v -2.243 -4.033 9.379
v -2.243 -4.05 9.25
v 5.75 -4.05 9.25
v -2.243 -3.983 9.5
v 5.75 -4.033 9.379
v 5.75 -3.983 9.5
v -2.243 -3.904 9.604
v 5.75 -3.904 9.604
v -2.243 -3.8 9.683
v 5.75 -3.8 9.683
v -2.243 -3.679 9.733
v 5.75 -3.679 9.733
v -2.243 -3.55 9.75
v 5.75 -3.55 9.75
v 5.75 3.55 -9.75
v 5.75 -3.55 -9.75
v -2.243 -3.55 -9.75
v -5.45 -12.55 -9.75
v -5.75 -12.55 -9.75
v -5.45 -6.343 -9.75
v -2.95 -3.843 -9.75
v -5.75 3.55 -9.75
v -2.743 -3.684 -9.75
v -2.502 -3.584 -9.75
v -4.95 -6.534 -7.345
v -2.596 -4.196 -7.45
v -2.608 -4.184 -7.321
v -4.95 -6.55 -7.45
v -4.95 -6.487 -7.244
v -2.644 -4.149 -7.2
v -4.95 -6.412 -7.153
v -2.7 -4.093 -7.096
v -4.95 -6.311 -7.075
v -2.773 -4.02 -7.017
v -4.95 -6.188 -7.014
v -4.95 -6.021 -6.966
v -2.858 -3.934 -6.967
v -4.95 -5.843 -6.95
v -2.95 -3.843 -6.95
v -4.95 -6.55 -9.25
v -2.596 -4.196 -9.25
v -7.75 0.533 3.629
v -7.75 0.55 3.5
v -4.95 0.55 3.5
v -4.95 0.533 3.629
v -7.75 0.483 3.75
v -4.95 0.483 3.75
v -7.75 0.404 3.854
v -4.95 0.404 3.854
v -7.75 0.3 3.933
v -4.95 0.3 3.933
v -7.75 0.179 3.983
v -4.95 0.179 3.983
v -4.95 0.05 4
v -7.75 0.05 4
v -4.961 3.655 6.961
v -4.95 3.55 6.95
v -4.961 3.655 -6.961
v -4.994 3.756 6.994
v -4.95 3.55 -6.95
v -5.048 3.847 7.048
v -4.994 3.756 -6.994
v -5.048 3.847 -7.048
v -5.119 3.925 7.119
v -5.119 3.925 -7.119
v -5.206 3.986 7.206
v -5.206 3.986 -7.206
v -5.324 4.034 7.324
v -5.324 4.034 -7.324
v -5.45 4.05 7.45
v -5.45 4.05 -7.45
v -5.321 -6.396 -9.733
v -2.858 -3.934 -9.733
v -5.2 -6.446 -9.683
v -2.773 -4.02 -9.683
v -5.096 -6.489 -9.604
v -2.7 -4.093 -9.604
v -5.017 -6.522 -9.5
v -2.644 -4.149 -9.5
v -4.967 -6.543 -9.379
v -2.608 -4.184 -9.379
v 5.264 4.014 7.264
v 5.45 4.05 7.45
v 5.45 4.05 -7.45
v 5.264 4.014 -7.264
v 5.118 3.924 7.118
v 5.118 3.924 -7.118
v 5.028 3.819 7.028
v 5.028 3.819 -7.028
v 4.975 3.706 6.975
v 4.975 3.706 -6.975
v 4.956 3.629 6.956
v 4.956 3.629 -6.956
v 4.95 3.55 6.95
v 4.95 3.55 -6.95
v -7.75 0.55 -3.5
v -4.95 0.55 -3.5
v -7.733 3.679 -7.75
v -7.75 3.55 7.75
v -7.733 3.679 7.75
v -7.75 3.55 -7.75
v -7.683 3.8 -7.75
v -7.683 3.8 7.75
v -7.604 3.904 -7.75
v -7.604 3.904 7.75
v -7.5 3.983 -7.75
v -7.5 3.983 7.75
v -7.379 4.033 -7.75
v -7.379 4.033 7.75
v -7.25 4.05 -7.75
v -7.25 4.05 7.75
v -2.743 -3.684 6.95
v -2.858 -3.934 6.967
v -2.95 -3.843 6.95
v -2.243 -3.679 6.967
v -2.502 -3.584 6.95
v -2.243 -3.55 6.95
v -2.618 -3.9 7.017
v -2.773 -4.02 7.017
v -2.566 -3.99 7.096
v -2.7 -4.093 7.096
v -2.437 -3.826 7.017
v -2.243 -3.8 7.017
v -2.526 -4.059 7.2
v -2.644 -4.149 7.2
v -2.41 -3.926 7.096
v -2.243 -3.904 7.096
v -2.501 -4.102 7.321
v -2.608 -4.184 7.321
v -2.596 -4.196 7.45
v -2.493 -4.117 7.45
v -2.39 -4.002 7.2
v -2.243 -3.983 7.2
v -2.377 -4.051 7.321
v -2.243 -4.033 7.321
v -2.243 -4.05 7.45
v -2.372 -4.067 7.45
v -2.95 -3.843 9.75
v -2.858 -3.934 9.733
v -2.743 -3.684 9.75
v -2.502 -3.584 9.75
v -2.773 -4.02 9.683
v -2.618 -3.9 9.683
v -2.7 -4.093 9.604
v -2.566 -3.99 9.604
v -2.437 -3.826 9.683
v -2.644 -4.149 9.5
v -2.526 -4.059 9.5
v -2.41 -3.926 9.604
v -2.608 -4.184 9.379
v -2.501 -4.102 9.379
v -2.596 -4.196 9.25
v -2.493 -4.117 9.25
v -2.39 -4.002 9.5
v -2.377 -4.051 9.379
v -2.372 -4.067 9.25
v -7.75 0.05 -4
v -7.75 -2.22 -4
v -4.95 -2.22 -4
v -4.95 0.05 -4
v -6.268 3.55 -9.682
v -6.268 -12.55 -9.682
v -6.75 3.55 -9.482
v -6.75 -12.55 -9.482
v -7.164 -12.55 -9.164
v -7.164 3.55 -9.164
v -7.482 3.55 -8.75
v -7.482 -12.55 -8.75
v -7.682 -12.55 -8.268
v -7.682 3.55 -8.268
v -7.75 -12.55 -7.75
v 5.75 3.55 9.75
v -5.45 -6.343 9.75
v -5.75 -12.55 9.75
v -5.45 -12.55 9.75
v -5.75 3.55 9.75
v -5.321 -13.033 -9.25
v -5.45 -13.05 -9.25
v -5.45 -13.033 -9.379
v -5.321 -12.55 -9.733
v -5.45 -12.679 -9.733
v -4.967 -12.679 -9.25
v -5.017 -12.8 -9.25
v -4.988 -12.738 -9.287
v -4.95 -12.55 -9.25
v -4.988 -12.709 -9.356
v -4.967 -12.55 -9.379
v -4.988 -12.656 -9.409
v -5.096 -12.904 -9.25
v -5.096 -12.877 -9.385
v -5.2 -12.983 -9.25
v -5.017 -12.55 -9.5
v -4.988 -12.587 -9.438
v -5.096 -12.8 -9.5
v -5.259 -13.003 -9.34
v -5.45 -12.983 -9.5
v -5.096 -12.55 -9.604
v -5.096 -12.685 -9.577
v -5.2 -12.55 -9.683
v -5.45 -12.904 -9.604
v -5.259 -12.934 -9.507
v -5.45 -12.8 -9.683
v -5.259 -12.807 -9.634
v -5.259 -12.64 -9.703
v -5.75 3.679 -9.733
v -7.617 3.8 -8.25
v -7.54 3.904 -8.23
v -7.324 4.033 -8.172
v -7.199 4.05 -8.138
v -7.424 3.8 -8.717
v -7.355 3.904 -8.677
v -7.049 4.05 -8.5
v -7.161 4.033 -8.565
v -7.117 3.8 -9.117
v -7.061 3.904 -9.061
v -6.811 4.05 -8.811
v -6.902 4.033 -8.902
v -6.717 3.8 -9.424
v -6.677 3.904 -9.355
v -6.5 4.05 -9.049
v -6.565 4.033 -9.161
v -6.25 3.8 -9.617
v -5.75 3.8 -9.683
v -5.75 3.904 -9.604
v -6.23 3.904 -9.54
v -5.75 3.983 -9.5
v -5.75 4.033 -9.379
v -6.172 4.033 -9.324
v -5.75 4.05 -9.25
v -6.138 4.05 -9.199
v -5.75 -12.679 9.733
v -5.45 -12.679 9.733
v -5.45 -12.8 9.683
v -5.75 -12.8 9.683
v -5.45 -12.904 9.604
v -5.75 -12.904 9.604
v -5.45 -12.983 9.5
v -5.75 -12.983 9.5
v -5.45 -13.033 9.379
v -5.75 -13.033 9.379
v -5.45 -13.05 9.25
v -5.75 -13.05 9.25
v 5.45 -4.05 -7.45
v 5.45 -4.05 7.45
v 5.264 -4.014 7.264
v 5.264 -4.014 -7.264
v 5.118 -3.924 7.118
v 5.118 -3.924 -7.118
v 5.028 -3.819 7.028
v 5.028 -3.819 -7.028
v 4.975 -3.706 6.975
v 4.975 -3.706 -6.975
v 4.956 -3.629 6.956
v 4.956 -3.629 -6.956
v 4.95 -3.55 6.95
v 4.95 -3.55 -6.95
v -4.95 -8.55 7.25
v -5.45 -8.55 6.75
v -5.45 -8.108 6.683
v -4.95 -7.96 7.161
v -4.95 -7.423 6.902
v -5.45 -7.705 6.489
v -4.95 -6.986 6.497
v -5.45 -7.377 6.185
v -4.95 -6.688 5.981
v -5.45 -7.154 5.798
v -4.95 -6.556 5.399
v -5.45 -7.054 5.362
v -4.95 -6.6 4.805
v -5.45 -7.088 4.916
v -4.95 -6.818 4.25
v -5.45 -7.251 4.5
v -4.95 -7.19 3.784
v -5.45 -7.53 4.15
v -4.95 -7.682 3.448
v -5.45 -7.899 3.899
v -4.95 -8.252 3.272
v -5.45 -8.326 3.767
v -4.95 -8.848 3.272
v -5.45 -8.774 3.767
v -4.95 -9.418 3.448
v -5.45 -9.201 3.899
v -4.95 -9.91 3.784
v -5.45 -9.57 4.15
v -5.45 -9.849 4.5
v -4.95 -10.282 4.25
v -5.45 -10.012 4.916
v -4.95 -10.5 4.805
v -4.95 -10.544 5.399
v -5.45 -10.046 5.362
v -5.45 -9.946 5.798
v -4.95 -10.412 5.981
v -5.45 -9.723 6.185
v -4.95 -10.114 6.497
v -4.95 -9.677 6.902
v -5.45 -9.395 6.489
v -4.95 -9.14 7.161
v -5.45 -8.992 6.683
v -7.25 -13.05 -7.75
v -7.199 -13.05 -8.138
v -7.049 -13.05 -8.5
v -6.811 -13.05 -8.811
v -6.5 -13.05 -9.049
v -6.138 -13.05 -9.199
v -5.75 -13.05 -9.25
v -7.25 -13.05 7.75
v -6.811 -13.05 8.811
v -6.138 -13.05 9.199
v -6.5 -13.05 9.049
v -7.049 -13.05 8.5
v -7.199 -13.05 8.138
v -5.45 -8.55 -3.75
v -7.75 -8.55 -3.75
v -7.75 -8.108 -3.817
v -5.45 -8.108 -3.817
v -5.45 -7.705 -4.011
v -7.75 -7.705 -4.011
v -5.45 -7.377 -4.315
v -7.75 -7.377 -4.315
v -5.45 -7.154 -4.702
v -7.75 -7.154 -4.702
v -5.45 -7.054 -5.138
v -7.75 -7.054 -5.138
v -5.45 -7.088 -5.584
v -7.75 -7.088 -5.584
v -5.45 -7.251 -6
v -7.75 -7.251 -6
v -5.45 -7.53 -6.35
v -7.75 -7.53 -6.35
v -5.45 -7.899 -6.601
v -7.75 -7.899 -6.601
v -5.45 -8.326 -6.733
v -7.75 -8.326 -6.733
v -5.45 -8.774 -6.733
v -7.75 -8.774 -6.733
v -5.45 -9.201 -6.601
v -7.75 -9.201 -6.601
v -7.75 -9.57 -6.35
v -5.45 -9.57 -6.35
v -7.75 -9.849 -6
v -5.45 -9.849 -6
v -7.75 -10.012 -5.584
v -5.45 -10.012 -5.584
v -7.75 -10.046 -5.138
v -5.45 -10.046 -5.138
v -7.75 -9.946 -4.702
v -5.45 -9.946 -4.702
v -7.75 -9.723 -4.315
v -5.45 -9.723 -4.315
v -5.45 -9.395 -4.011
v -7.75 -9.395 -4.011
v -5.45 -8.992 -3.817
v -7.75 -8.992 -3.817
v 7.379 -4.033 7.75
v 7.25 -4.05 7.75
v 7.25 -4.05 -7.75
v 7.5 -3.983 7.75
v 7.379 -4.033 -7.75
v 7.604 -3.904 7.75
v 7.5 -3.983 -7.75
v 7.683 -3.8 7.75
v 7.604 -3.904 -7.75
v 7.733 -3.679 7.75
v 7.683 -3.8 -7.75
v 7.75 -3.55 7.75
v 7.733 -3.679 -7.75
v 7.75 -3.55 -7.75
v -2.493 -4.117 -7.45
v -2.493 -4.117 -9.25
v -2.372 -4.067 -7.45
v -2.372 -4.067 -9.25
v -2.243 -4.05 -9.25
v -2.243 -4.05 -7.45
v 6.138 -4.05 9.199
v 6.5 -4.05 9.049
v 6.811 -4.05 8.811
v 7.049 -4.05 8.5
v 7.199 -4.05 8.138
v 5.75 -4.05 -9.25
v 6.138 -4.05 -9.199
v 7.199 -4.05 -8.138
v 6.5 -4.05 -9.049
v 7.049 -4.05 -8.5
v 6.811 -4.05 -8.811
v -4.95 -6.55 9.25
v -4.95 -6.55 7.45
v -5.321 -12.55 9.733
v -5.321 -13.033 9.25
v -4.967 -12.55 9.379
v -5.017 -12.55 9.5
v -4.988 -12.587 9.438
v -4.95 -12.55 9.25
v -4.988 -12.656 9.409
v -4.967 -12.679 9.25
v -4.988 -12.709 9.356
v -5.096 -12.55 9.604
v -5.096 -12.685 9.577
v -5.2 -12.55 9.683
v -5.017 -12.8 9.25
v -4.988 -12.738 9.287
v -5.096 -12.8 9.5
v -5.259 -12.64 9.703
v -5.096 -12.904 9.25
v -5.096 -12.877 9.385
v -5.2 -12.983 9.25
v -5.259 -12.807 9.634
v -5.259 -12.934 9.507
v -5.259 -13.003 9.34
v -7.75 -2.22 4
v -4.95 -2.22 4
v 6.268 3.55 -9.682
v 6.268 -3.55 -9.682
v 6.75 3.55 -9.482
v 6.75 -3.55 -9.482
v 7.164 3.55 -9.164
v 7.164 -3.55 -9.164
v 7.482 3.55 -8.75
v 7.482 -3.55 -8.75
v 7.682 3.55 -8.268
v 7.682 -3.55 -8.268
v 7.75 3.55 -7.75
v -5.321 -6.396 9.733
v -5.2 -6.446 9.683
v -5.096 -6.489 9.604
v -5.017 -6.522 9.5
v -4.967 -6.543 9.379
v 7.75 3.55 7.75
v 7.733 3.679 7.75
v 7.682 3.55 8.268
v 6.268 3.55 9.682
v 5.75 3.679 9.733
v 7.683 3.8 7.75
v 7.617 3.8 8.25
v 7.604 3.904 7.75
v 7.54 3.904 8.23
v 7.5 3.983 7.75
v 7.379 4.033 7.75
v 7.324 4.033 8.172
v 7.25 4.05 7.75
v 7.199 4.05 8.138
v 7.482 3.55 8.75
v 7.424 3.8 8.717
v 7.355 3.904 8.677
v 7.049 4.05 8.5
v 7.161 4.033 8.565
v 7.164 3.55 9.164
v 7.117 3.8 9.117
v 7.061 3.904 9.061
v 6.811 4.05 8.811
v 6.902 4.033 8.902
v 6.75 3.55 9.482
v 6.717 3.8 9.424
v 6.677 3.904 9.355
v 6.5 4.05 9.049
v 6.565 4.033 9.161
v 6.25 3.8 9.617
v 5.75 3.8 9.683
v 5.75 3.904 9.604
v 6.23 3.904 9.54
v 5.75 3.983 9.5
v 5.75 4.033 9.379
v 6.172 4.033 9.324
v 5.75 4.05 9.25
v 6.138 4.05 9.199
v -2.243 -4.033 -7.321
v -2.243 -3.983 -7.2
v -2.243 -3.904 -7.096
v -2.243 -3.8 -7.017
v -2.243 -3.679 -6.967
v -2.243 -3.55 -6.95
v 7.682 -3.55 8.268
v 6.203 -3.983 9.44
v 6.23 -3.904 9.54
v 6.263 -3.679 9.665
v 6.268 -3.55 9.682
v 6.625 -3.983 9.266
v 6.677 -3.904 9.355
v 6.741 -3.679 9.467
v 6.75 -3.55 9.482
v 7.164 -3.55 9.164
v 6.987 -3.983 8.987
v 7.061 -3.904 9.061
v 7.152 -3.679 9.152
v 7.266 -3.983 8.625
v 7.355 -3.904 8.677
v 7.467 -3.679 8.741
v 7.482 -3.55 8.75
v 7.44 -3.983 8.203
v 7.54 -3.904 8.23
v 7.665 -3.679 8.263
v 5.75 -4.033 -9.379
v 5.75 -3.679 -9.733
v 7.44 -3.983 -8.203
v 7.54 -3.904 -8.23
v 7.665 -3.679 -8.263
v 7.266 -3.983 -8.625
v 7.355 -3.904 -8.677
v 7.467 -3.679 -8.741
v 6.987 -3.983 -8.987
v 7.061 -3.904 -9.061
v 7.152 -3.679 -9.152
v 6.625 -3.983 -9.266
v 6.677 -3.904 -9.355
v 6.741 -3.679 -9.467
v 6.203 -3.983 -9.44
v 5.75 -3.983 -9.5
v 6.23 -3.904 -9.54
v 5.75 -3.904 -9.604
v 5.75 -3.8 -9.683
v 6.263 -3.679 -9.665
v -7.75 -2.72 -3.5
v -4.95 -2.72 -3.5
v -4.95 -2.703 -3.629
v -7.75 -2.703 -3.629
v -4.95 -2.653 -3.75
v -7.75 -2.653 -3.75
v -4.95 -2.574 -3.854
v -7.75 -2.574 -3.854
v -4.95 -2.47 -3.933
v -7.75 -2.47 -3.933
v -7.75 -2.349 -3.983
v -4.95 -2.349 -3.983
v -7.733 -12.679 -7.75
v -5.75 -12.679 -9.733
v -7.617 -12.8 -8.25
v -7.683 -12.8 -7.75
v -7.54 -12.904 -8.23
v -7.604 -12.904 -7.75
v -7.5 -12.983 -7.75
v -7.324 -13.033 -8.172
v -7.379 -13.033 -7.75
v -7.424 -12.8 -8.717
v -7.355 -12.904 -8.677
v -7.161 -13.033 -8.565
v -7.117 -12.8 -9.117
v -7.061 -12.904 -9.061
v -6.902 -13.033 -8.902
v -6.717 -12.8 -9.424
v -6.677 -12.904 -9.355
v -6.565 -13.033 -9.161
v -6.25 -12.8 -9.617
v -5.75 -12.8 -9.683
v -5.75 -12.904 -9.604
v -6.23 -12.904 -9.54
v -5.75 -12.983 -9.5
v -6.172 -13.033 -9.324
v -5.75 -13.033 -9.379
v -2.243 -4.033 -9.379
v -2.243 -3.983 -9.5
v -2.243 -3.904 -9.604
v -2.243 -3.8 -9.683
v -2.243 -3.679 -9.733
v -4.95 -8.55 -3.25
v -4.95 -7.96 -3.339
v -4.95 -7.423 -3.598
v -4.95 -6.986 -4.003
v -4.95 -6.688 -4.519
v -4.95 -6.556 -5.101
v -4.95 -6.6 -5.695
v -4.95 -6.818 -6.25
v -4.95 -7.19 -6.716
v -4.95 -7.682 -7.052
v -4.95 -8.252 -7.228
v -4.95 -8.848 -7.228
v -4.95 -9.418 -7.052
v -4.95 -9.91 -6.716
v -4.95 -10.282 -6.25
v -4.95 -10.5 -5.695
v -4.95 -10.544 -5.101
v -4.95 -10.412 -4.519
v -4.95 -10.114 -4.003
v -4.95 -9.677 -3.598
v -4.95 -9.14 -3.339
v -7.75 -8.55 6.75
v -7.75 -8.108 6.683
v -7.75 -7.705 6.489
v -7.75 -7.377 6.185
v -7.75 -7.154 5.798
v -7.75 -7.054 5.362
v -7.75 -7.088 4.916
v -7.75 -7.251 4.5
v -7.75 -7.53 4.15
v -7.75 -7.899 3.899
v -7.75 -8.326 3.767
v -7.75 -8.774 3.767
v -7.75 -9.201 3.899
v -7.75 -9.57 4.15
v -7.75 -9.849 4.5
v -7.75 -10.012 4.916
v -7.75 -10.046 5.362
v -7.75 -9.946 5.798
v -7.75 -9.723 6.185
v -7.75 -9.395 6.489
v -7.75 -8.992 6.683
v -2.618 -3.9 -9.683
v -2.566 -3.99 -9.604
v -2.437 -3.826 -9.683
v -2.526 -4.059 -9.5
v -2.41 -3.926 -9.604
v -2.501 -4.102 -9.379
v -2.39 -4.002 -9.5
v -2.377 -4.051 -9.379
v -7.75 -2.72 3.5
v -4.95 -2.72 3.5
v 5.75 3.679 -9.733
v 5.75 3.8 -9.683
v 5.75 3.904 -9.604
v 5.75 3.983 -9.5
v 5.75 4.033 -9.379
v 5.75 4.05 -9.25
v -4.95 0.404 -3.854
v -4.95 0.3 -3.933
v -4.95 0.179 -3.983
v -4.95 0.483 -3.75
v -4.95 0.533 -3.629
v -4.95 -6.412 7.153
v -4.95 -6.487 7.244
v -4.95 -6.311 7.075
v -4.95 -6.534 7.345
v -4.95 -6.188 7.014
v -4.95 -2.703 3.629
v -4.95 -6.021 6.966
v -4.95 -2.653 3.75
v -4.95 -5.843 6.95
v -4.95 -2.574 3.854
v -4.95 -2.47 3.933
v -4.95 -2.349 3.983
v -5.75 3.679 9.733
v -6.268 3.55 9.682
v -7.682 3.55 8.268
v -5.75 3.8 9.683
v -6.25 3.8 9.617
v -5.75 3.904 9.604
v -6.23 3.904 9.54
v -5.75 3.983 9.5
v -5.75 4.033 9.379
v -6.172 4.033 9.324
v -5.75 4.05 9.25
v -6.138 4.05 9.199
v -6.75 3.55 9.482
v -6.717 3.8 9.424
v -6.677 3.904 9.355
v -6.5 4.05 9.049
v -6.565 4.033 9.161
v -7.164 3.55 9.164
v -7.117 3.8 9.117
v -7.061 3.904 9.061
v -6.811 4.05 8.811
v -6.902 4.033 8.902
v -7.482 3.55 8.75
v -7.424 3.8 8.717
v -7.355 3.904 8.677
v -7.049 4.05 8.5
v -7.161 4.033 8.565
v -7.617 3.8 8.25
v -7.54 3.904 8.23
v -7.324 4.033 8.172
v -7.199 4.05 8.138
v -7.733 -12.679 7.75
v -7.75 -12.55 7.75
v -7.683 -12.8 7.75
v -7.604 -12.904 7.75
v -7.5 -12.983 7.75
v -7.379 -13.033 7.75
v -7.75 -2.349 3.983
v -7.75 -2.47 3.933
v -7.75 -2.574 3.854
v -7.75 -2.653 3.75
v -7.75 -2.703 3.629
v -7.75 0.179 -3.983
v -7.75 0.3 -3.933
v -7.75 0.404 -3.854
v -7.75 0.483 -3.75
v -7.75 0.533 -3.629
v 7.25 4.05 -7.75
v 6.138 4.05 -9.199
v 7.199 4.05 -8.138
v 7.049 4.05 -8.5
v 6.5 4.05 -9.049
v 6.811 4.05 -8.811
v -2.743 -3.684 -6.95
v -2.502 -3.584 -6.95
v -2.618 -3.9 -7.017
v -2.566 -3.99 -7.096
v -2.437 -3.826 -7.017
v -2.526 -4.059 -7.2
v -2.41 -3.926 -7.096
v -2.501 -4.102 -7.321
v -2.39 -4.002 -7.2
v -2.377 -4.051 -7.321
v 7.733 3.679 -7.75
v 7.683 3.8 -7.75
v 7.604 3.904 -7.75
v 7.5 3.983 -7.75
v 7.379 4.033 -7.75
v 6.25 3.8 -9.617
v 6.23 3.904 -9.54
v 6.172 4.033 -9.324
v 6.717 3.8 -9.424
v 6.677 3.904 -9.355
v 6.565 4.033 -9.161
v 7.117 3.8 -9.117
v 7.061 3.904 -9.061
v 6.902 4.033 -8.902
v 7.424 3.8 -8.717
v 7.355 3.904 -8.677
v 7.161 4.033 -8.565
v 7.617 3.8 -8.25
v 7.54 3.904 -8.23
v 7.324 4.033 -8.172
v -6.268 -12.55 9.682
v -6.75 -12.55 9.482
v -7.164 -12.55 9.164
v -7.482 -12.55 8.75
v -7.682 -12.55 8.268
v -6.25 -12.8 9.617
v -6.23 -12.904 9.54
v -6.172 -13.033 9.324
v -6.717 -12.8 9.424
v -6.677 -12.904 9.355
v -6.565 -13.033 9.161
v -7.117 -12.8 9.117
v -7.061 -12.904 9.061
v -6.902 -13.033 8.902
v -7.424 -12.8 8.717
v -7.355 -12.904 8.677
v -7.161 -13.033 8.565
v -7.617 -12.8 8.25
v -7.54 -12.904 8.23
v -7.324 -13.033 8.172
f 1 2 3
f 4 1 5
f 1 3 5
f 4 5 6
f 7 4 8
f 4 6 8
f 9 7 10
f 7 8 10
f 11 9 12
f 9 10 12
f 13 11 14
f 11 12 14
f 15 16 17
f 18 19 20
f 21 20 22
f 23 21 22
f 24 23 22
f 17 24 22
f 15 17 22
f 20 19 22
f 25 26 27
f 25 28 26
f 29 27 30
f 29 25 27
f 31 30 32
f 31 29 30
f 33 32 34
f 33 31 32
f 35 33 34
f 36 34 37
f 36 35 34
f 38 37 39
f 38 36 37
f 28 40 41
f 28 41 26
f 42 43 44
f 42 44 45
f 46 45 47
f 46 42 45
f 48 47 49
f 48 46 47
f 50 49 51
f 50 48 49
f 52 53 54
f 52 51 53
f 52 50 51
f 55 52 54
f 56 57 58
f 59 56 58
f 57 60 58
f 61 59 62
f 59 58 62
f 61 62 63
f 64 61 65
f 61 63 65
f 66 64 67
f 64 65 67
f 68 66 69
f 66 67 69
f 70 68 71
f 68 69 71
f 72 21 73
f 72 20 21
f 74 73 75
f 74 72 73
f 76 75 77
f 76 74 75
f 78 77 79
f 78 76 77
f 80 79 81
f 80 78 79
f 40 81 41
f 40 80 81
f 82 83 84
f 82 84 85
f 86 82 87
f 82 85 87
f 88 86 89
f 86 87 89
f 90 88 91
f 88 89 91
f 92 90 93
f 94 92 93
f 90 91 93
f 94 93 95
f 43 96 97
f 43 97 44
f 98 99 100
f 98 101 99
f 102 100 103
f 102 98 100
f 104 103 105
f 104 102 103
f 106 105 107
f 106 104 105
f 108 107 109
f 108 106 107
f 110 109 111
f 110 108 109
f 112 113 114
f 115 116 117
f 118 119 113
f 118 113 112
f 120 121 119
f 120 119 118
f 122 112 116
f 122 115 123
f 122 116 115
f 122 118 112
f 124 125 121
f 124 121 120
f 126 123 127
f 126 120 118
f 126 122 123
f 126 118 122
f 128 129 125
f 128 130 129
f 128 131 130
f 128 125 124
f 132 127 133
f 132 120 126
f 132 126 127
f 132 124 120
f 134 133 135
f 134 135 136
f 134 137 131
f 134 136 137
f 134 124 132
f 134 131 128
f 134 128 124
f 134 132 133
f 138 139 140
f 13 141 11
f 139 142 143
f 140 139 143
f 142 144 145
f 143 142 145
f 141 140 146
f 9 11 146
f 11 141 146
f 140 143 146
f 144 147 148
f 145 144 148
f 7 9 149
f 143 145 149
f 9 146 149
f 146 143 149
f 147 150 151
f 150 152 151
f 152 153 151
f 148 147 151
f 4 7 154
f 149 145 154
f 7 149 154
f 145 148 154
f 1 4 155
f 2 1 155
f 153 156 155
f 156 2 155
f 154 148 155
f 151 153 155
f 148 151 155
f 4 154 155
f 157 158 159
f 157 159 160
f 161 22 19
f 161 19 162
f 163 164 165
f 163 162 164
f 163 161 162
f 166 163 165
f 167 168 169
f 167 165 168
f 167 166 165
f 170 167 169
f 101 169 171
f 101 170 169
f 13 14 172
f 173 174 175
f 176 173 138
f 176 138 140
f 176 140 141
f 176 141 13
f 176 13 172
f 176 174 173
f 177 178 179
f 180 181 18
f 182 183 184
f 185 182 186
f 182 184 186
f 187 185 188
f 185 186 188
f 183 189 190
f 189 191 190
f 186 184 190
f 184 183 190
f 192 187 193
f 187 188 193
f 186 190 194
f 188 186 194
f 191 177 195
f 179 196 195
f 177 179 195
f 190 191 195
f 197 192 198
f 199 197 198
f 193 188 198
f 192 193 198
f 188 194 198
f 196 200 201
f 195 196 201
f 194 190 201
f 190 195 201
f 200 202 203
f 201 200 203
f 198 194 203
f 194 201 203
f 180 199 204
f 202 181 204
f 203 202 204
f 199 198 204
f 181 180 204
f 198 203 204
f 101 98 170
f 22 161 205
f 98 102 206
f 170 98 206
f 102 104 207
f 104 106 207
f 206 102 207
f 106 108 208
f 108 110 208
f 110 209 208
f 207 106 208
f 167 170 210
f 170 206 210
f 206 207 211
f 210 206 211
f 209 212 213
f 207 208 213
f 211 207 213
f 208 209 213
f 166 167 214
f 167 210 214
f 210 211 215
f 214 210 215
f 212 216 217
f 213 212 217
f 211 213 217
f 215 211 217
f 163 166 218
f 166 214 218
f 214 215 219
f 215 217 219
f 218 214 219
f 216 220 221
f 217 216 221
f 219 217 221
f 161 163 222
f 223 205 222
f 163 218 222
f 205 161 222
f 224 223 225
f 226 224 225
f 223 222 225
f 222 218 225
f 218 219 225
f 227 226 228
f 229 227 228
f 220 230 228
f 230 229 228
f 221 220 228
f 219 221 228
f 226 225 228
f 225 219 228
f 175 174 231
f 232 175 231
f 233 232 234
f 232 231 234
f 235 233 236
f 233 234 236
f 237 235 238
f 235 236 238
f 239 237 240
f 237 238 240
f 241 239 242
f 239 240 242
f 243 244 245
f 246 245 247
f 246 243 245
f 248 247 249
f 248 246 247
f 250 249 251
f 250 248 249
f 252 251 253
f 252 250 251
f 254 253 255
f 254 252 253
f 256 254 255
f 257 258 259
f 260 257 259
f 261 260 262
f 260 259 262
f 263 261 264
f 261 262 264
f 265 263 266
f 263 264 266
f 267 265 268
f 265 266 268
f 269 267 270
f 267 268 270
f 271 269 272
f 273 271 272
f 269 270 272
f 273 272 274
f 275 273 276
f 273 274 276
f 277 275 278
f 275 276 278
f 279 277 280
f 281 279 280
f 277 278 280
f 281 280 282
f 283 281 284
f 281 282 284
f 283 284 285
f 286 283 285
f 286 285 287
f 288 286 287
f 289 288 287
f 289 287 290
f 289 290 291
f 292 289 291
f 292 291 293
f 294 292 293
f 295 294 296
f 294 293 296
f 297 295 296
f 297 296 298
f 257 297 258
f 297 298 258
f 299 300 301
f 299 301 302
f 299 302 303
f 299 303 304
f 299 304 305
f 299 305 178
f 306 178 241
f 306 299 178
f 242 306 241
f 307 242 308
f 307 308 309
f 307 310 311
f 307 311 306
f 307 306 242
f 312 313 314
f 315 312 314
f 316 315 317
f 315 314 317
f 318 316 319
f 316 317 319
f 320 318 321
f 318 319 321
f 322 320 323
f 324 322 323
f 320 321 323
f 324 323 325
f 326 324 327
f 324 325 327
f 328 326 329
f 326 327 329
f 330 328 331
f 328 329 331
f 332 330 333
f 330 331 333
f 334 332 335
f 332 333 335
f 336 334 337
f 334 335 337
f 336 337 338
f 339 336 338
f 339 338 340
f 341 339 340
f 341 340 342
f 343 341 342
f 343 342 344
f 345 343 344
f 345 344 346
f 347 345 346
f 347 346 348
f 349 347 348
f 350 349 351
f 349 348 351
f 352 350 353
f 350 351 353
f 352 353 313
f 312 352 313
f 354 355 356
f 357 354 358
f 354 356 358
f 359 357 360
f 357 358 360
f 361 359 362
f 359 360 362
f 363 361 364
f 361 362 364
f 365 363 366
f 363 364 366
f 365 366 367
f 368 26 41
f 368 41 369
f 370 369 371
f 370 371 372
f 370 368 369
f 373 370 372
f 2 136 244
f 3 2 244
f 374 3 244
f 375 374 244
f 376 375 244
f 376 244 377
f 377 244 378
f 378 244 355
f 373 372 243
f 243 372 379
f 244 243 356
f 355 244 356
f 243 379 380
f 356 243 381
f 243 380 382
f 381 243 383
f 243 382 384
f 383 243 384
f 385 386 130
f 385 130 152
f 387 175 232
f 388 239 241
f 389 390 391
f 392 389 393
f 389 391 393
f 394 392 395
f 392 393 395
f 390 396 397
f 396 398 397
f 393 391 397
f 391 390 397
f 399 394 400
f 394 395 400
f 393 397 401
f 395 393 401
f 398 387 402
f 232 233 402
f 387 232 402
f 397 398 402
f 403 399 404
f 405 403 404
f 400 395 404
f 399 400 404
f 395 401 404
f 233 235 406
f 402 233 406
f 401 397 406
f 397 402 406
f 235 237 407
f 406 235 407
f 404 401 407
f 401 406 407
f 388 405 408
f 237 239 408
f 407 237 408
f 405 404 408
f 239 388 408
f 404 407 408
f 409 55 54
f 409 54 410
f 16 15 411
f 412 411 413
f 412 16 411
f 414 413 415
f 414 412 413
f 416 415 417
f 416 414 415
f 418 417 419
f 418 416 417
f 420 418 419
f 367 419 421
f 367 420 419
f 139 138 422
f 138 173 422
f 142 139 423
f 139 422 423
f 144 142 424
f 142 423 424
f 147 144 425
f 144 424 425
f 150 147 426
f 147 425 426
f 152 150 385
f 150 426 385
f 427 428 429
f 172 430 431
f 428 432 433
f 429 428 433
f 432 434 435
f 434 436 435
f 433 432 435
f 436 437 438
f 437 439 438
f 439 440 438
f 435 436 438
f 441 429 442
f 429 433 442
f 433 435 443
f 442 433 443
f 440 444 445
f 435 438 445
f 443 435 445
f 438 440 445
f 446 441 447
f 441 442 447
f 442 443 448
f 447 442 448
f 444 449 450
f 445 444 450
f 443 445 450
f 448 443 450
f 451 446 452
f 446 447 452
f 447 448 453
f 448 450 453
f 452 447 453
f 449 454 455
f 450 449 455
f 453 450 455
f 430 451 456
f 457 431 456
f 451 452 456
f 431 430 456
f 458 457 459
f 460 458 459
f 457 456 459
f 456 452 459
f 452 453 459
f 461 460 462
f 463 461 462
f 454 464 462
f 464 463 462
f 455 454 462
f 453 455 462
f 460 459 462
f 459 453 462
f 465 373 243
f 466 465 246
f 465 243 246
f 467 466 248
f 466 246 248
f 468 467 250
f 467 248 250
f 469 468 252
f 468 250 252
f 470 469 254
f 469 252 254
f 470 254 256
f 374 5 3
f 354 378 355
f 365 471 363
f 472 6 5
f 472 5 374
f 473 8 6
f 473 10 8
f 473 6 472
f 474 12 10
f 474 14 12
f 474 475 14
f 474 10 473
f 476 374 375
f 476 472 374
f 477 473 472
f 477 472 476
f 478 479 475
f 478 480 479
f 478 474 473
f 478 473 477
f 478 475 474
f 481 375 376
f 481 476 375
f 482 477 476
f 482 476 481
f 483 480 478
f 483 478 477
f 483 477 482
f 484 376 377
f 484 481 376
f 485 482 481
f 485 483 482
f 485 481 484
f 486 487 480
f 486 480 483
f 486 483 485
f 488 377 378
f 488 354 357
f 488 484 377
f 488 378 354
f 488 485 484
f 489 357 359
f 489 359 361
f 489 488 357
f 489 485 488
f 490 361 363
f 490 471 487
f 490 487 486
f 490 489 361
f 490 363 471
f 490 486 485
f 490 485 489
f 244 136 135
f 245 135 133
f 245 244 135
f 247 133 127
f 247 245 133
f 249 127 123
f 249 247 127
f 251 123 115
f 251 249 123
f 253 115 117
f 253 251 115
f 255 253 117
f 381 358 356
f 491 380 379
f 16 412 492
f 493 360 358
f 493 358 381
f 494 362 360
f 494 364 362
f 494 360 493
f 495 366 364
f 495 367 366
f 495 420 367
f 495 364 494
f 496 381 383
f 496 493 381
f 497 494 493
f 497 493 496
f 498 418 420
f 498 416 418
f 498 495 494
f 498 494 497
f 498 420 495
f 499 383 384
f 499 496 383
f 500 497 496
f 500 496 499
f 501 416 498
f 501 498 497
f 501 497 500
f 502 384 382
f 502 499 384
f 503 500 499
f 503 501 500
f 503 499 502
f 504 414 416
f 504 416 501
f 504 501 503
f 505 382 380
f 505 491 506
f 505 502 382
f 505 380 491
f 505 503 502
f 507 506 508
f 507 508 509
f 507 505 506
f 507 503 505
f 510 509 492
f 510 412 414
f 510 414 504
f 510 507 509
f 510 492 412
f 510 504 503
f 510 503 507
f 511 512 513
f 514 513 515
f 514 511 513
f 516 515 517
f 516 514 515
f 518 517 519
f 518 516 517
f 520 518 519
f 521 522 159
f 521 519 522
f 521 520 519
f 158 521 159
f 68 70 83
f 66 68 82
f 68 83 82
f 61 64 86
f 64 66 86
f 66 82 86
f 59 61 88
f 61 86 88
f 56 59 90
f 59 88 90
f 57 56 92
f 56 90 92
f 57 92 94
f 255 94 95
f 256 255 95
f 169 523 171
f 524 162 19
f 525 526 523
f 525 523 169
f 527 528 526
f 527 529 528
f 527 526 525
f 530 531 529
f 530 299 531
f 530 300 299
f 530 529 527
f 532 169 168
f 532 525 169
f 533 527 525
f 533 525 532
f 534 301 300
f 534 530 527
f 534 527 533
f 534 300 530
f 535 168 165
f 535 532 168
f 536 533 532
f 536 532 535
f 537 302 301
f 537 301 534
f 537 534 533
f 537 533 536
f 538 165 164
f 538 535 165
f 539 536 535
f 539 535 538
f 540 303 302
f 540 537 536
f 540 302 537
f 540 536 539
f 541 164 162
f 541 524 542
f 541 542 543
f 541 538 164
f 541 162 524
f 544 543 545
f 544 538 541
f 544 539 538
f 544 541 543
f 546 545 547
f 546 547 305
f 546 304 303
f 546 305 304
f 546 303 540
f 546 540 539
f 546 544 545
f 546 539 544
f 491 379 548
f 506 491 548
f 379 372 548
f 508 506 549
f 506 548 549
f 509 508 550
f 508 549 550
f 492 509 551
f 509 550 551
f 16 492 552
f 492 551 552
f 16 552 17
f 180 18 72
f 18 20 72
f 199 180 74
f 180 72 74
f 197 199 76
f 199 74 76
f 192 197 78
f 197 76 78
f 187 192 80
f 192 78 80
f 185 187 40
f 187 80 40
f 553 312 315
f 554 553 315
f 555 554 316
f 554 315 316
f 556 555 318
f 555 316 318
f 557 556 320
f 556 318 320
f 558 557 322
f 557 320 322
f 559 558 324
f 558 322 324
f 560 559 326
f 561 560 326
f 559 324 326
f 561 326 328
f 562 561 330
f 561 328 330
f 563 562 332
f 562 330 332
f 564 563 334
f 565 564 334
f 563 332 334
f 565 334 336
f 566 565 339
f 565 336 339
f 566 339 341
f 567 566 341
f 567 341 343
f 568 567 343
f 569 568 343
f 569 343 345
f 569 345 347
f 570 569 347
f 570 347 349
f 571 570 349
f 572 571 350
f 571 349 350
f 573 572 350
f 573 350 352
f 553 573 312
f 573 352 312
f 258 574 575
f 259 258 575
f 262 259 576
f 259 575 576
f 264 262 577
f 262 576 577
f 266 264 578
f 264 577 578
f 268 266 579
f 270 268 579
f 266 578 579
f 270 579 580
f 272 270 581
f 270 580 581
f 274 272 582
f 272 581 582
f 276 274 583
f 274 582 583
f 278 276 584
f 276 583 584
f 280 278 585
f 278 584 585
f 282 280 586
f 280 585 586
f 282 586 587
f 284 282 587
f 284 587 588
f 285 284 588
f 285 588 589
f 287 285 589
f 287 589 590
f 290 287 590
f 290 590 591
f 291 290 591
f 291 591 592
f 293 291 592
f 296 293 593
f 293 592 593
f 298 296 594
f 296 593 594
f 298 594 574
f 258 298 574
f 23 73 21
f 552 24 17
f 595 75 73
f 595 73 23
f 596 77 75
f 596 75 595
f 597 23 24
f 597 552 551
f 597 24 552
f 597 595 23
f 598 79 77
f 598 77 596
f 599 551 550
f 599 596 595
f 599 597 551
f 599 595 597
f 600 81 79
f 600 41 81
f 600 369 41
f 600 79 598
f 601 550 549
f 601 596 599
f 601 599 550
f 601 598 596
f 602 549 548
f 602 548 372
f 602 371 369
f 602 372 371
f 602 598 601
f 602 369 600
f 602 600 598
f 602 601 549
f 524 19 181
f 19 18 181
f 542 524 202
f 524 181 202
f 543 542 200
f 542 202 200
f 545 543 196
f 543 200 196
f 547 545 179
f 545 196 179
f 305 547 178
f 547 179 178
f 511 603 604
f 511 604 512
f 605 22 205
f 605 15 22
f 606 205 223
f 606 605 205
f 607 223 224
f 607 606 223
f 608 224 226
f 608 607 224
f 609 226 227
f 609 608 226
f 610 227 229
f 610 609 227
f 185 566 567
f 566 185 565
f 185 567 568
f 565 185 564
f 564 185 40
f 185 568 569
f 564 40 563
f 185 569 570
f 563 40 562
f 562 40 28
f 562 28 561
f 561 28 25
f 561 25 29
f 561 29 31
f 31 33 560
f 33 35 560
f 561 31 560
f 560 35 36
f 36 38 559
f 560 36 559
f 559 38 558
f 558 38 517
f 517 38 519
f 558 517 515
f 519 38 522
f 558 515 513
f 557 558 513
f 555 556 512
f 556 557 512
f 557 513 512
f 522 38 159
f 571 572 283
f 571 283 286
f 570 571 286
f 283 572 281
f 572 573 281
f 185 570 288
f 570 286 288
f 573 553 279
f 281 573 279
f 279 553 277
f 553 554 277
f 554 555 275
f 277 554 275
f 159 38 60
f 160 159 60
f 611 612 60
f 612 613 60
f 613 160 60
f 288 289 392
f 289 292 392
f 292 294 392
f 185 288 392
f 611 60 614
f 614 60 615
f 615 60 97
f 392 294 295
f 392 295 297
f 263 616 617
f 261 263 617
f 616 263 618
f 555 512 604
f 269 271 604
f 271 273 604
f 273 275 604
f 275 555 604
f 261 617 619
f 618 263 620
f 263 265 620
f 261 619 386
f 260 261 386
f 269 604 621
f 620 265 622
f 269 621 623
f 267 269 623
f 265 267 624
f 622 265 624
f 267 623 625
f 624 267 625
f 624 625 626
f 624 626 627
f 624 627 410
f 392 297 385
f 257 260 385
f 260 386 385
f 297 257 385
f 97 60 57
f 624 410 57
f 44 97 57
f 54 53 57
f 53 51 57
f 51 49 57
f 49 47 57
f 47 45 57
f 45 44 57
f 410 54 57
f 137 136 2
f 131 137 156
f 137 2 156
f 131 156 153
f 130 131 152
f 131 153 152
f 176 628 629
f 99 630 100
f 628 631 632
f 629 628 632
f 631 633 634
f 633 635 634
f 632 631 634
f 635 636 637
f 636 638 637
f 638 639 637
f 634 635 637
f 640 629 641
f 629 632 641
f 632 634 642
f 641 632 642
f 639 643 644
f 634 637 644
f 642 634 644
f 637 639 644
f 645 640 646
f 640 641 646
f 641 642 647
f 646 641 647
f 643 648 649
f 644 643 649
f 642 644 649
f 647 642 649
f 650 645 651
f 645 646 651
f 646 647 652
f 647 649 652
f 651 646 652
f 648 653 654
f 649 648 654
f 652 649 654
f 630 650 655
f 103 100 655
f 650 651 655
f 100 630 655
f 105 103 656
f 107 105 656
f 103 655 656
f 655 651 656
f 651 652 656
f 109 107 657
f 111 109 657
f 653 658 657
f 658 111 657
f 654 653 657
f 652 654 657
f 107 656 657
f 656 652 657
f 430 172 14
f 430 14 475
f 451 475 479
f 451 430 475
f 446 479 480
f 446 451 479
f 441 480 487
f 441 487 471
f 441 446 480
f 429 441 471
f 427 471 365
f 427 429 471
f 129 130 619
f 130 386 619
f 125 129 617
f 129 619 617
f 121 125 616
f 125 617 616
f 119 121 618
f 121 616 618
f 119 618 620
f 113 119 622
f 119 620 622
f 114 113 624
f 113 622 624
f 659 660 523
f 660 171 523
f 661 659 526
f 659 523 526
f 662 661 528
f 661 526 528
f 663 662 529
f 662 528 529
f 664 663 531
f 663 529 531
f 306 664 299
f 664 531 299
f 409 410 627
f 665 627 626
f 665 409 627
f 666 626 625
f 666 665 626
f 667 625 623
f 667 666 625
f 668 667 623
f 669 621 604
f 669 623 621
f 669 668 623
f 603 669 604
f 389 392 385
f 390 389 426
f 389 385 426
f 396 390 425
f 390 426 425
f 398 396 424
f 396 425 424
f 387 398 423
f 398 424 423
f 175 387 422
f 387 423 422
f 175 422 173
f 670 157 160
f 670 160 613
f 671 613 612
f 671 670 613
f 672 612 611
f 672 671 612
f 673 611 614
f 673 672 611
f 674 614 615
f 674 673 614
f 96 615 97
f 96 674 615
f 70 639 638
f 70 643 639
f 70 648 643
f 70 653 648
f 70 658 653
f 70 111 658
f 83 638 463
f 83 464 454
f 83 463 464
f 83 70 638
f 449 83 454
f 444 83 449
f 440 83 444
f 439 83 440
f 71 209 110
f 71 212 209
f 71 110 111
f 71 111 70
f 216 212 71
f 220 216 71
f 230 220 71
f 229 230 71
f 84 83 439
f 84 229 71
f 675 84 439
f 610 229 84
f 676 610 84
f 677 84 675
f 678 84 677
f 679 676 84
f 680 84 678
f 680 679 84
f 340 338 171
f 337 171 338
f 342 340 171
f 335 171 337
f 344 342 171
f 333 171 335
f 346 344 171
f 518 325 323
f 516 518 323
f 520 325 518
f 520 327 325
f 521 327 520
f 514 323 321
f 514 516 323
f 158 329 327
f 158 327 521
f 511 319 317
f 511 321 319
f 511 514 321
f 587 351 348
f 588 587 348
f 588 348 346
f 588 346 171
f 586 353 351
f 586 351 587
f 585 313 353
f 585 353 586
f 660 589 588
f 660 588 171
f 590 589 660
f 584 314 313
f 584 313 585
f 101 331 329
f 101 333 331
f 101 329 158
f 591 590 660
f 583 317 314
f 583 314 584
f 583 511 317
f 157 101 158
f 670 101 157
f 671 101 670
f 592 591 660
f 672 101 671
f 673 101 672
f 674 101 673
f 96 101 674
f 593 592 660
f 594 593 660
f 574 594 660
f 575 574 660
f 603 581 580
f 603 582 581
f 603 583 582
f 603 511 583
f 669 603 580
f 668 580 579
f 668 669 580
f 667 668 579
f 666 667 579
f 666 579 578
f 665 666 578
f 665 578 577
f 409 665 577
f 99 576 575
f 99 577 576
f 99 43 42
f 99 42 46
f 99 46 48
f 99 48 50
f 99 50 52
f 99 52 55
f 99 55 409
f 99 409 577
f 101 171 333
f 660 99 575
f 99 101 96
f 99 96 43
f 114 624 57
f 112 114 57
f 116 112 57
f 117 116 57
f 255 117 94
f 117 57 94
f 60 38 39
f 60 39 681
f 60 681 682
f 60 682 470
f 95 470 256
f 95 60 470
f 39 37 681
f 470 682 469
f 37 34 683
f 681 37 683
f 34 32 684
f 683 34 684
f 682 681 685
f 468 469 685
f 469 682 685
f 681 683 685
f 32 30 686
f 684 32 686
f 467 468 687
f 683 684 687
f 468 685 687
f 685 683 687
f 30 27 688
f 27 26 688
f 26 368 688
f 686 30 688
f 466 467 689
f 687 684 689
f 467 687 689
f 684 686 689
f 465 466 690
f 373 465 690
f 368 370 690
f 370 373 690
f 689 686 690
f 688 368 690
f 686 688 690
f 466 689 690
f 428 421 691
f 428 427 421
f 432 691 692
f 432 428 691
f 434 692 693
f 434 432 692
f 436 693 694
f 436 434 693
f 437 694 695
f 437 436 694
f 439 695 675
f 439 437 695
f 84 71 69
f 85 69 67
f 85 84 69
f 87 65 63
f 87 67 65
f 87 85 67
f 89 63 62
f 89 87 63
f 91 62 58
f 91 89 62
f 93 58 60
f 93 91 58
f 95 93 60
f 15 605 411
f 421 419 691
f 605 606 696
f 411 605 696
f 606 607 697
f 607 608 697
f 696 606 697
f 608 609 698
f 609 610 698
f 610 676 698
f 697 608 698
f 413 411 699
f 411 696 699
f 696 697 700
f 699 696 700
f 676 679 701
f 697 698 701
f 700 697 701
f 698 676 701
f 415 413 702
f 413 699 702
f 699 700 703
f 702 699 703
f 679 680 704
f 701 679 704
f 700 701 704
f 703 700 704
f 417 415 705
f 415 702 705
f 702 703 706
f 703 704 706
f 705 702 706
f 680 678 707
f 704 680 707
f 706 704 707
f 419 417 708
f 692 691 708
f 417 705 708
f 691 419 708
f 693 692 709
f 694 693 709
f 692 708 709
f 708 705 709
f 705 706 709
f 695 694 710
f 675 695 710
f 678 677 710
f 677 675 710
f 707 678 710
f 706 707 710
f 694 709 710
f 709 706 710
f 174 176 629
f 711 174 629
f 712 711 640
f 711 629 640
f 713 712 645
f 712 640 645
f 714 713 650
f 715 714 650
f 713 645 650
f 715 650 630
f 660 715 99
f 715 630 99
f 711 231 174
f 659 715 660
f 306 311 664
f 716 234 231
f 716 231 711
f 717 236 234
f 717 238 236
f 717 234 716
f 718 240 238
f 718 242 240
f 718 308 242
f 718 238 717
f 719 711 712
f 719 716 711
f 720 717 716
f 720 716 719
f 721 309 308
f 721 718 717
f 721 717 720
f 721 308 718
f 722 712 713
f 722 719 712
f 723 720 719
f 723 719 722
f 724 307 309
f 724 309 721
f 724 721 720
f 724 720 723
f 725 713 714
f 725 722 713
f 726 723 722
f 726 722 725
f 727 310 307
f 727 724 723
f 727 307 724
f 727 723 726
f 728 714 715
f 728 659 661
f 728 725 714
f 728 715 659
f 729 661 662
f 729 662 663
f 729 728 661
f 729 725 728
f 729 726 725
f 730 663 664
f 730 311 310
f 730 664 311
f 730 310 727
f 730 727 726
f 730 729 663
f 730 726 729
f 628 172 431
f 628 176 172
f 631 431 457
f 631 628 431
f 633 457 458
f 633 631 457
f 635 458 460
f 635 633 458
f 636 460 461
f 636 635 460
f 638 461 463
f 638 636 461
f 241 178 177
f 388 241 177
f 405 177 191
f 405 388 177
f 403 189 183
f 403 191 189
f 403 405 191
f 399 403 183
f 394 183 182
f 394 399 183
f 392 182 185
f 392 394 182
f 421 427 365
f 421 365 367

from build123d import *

# Parameters (mm, degrees)
SKETCH1_W                      = 15.5
SKETCH1_H                      = 19.5
SKETCH1_W_2                    = 9.9
SKETCH1_H_2                    = 13.9
BOSS_EXTRUDE1_DEPTH            = 4.05
SKETCH2_W                      = 19.5
SKETCH2_H                      = 9
SKETCH2_R                      = 1.5
BOSS_EXTRUDE2_DEPTH            = 2.8
CHAMFER1_SIZE                  = 2.5
FILLET1_R                      = 2
FILLET2_R                      = 0.5
CHAMFER2_SIZE                  = 0.5
CUT_EXTRUDE1_DEPTH             = 1.0000001
CUT_EXTRUDE1_DIRECTION_2_REACH = 17.5


with BuildPart() as part:
    # Sketch1 → Boss-Extrude1 (new body, symmetric)
    with BuildSketch(Plane(origin=(0, 0, 0), x_dir=(1, 0, 0), z_dir=(0, 1, 0))):
        Rectangle(SKETCH1_W, SKETCH1_H)
        Rectangle(SKETCH1_W_2, SKETCH1_H_2, mode=Mode.SUBTRACT)
    extrude(amount=BOSS_EXTRUDE1_DEPTH, both=True)

    # Sketch2 → Boss-Extrude2 (add)
    with BuildSketch(Plane.ZY.offset(7.75)):
        with Locations((0, -8.55)):
            Rectangle(SKETCH2_W, SKETCH2_H)
        with Locations((-5.25, -8.55)):
            Circle(SKETCH2_R, mode=Mode.SUBTRACT)
        with Locations((5.25, -8.55)):
            Circle(SKETCH2_R, mode=Mode.SUBTRACT)
    extrude(amount=-BOSS_EXTRUDE2_DEPTH)

    # Chamfer1
    chamfer1_edges = [part.edges().sort_by_distance(p)[0] for p in [
        (-4.95, -4.05, -8.35),
        (-4.95, -4.05, 8.35),
    ]]
    chamfer(chamfer1_edges, length=CHAMFER1_SIZE)

    # Fillet1
    fillet1_edges = [part.edges().sort_by_distance(p)[0] for p in [
        (-7.75, -4.5, -9.75),
        (7.75, 0, -9.75),
        (7.75, 0, 9.75),
        (-7.75, -4.5, 9.75),
    ]]
    fillet(fillet1_edges, radius=FILLET1_R)

    # Fillet2
    fillet2_edges = [part.edges().sort_by_distance(p)[0] for p in [
        (4.95, -4.05, 0),
        (1.25, -4.05, -6.95),
        (-4.95, 4.05, 0),
        (0, 4.05, 6.95),
        (4.95, 4.05, 0),
        (0, 4.05, -6.95),
        (-5.35, -13.05, -9.75),
        (-4.95, -9.8, 9.75),
        (-4.95, -13.05, 0),
        (-5.35, -13.05, 9.75),
        (1.65, -4.05, 9.75),
        (1.25, -4.05, 6.95),
        (-2.45, -4.05, 8.35),
        (-2.45, -4.05, -8.35),
        (-4.95, -9.8, -9.75),
        (-3.7, -5.3, -9.75),
        (-3.7, -5.3, -6.95),
        (-3.7, -5.3, 6.95),
        (-3.7, -5.3, 9.75),
        (1.65, -4.05, -9.75),
        (0, 4.05, -9.75),
        (7.75, -4.05, 0),
        (7.164213562, -4.05, 9.164213562),
        (7.164213562, -4.05, -9.164213562),
        (7.75, 4.05, 0),
        (-7.75, 4.05, 0),
        (0, 4.05, 9.75),
        (-7.164213562, 4.05, 9.164213562),
        (-7.164213562, 4.05, -9.164213562),
        (7.164213562, 4.05, 9.164213562),
        (7.164213562, 4.05, -9.164213562),
        (-7.75, -13.05, 0),
        (-7.164213562, -13.05, 9.164213562),
        (-7.164213562, -13.05, -9.164213562),
    ]]
    fillet(fillet2_edges, radius=FILLET2_R)

    # Chamfer2
    chamfer2_edges = [part.edges().sort_by_distance(p)[0] for p in [
        (-4.95, -8.55, 3.75),
        (-4.95, -8.55, -6.75),
    ]]
    chamfer(chamfer2_edges, length=CHAMFER2_SIZE)

    # Sketch3 → Cut-Extrude1 (cut)
    with BuildSketch(Plane.ZY.offset(7.75)):
        with BuildLine():
            Line((-3.5, 0.55), (3.5, 0.55))
            ThreePointArc((3.5, 0.55), (3.853553391, 0.403553391), (4, 0.05))
            Line((4, 0.05), (4, -2.22))
            ThreePointArc((4, -2.22), (3.853553391, -2.573553391), (3.5, -2.72))
            Line((3.5, -2.72), (-3.5, -2.72))
            ThreePointArc((-3.5, -2.72), (-3.853553391, -2.573553391), (-4, -2.22))
            Line((-4, -2.22), (-4, 0.05))
            ThreePointArc((-4, 0.05), (-3.853553391, 0.403553391), (-3.5, 0.55))
        make_face()
    extrude(amount=CUT_EXTRUDE1_DEPTH, mode=Mode.SUBTRACT)

    # Sketch3 → Cut-Extrude1 direction 2 (cut, up to next)
    with BuildSketch(Plane.ZY.offset(7.75), mode=Mode.PRIVATE) as cut_extrude1_direction_2_sk1:
        with BuildLine():
            Line((-3.5, 0.55), (3.5, 0.55))
            ThreePointArc((3.5, 0.55), (3.853553391, 0.403553391), (4, 0.05))
            Line((4, 0.05), (4, -2.22))
            ThreePointArc((4, -2.22), (3.853553391, -2.573553391), (3.5, -2.72))
            Line((3.5, -2.72), (-3.5, -2.72))
            ThreePointArc((-3.5, -2.72), (-3.853553391, -2.573553391), (-4, -2.22))
            Line((-4, -2.22), (-4, 0.05))
            ThreePointArc((-4, 0.05), (-3.853553391, 0.403553391), (-3.5, 0.55))
        make_face()
    cut_extrude1_direction_2_tool1 = extrude(cut_extrude1_direction_2_sk1.sketch, amount=-CUT_EXTRUDE1_DIRECTION_2_REACH, mode=Mode.PRIVATE) & part.part
    add(cut_extrude1_direction_2_tool1.solids().sort_by_distance((-7.75, -1.085, 0))[0], mode=Mode.SUBTRACT)


solid = part.part
